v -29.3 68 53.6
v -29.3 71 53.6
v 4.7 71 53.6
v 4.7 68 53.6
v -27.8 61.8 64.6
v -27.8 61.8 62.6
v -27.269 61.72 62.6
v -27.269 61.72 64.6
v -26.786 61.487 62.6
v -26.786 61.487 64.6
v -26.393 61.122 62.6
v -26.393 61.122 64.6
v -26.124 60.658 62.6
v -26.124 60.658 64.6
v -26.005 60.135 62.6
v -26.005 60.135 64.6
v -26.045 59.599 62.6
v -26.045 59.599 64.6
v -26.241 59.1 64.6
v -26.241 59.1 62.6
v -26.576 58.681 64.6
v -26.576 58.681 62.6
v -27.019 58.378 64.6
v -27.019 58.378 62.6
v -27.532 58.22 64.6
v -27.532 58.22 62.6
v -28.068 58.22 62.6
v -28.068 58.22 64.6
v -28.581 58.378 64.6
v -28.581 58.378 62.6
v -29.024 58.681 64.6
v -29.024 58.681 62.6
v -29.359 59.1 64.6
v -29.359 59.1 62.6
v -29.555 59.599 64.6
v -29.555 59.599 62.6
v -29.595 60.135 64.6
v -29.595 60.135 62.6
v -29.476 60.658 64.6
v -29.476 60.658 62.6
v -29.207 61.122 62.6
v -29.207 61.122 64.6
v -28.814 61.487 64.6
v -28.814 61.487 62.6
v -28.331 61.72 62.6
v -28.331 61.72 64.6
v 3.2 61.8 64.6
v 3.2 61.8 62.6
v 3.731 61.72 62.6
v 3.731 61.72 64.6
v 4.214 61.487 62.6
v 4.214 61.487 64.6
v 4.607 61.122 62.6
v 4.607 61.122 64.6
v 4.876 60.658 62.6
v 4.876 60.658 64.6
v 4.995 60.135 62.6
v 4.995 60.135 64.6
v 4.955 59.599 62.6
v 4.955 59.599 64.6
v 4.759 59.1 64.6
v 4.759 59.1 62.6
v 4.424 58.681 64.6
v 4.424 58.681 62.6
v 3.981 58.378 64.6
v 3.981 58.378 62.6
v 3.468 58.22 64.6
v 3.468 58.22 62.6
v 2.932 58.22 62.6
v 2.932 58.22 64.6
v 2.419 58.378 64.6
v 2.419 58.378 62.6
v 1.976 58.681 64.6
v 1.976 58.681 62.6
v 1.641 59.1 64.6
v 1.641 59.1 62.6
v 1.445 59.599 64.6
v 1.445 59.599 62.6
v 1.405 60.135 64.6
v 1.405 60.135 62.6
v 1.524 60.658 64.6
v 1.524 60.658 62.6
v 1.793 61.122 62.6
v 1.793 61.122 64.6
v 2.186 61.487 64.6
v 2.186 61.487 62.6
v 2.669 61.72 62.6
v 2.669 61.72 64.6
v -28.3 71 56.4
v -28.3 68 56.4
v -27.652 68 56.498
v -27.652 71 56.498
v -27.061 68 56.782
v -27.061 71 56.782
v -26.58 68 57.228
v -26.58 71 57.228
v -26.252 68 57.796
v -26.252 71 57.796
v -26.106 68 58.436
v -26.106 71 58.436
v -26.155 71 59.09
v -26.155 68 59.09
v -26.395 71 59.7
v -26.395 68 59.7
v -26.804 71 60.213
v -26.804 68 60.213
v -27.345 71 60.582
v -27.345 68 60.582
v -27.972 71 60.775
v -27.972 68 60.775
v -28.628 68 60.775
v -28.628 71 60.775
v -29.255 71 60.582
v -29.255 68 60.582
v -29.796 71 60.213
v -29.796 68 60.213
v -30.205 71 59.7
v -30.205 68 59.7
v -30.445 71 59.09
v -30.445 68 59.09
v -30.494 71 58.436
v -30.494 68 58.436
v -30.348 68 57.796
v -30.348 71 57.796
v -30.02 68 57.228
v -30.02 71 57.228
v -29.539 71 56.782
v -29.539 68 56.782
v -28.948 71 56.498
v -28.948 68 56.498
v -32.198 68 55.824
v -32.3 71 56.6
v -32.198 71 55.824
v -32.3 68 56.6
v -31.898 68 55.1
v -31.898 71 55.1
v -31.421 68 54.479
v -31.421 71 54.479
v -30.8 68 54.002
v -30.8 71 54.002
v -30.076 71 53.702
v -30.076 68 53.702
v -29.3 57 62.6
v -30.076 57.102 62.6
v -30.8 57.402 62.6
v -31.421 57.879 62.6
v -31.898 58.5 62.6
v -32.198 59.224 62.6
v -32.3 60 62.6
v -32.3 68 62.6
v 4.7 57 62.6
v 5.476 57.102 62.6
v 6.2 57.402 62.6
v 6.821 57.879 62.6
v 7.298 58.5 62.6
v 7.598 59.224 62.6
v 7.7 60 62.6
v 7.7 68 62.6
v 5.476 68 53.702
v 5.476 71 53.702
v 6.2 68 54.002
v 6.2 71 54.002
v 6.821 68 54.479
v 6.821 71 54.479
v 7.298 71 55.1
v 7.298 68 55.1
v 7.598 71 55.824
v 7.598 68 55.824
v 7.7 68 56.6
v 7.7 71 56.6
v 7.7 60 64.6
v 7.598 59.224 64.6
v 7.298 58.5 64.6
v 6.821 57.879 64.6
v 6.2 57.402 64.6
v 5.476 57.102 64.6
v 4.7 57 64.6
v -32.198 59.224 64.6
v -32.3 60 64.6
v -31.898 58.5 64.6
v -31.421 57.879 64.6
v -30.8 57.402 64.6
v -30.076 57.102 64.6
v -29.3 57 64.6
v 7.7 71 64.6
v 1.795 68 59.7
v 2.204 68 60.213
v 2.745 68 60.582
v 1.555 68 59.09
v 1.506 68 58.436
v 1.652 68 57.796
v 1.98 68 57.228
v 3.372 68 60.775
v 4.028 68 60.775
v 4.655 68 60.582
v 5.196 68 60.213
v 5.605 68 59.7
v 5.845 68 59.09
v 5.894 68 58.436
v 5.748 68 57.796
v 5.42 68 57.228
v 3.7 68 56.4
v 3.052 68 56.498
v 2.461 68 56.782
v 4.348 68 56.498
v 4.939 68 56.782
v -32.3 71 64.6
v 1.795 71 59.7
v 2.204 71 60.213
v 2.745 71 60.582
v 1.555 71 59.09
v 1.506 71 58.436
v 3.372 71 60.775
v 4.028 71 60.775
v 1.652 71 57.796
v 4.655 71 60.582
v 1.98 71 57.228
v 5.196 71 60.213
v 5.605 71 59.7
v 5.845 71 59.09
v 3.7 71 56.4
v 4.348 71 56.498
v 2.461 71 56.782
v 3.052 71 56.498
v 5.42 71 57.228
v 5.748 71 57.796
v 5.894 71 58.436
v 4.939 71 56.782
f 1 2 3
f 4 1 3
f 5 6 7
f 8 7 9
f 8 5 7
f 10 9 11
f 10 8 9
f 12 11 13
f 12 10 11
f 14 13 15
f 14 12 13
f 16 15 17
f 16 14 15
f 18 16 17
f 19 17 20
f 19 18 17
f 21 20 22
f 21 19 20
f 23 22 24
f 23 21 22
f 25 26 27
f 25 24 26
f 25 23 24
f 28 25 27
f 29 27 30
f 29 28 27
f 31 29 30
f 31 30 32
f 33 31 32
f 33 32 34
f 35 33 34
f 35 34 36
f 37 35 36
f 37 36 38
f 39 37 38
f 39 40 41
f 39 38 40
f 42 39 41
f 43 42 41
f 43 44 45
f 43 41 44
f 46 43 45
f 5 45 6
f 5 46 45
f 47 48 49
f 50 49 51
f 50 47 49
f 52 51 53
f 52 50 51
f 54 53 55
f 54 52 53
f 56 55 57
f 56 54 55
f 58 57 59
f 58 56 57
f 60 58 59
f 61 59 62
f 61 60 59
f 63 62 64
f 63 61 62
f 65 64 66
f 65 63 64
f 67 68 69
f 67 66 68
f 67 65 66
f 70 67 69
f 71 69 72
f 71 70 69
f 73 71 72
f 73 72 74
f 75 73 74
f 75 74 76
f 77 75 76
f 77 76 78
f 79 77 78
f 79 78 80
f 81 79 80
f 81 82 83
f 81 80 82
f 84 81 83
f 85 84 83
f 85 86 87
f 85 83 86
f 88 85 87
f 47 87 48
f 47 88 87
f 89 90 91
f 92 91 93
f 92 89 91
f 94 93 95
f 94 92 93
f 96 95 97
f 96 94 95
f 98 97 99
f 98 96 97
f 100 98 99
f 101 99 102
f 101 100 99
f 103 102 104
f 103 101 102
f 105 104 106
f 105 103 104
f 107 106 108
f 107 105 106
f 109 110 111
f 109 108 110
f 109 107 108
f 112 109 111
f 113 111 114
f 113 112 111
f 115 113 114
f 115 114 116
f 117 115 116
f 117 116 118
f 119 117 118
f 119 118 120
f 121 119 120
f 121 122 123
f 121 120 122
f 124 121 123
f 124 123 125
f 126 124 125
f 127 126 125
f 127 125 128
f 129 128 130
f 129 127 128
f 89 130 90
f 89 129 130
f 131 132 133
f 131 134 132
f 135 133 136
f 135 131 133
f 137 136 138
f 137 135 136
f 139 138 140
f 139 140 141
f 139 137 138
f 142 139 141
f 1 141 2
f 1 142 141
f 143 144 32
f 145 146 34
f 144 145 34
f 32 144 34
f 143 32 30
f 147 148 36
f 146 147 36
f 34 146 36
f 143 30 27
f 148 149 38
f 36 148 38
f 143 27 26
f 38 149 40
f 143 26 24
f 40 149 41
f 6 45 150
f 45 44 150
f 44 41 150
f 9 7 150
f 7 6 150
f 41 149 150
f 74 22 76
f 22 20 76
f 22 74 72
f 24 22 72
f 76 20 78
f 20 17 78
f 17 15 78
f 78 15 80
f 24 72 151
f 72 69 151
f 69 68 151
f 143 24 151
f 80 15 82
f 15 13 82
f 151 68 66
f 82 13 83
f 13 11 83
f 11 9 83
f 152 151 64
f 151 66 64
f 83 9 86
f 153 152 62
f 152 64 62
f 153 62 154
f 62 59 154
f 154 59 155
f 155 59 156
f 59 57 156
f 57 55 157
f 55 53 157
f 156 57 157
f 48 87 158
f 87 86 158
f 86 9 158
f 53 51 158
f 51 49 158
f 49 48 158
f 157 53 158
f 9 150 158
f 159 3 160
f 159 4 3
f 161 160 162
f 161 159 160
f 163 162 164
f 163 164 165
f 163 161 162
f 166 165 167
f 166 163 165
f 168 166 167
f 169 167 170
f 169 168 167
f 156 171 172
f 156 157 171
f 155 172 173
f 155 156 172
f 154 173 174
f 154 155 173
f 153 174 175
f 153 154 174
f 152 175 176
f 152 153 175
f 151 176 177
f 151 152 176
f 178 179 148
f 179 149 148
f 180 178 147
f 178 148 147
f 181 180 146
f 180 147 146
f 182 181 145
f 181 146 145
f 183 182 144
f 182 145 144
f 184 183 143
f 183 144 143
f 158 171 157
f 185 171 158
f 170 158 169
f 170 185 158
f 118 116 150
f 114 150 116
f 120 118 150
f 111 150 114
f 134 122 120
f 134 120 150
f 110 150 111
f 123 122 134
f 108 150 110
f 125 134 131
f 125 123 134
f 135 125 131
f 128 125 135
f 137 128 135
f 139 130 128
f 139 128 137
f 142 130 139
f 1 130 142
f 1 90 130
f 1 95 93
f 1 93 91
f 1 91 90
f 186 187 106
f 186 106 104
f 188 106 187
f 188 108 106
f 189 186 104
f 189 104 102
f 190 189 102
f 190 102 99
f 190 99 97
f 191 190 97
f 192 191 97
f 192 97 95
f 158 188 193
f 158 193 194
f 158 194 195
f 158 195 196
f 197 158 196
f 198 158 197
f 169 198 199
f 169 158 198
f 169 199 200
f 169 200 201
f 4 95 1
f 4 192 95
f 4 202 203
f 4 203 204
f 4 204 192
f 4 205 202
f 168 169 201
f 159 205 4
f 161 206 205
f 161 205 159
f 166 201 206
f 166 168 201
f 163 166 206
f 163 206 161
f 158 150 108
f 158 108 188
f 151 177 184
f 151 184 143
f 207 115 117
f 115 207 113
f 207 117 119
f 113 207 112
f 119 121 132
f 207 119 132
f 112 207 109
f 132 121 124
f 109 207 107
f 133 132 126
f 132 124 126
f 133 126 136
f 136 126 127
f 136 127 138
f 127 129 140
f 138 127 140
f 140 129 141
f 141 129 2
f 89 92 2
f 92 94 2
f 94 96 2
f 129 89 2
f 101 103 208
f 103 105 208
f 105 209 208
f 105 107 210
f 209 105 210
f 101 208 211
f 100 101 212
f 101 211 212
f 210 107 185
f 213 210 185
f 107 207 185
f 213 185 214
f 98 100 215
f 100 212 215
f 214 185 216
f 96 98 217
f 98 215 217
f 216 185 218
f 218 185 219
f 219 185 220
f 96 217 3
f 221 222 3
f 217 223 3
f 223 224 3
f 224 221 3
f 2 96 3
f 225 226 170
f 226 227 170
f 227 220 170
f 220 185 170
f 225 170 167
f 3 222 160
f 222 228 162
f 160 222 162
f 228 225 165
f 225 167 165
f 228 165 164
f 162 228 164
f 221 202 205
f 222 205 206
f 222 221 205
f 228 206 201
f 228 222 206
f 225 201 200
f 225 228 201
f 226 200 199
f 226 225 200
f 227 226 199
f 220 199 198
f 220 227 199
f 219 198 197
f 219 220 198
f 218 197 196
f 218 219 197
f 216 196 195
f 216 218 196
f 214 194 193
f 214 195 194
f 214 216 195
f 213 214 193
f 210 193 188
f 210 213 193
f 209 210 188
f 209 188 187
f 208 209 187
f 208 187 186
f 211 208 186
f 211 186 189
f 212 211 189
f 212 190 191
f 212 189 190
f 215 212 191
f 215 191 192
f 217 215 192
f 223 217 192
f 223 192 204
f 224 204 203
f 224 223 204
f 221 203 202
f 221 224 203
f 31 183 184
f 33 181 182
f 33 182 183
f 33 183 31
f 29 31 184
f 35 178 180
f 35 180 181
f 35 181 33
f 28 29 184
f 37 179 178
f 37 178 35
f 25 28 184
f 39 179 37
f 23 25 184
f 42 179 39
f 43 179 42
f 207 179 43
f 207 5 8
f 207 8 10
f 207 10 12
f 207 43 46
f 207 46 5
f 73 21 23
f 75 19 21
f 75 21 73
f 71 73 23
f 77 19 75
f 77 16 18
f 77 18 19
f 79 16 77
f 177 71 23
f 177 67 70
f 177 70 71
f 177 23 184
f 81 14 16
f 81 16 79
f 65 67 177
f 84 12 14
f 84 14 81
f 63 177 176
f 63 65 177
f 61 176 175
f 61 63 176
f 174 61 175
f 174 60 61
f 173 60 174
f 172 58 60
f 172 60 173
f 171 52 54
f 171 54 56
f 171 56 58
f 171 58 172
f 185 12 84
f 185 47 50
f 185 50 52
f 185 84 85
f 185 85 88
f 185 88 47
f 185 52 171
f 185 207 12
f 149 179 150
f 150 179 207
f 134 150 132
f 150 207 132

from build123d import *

# Parameters (mm, degrees)
CYLINDER001_R            = 2.2
CYLINDER001_DEPTH        = 10
ARRAY005_Y_COUNT         = 2
ARRAY005_Y_PITCH         = 32
CYLINDER008_R            = 1.8
CYLINDER008_DEPTH        = 10
ARRAY004_Y_COUNT         = 2
ARRAY004_Y_PITCH         = 31
ARRAY004_PLACEMENT_ANGLE = 90
BOX007_W                 = 2
BOX007_H                 = 40
BOX007_DEPTH             = 11
FILLET004_R              = 3
BOX006_W                 = 11
BOX006_H                 = 40
BOX006_DEPTH             = 3
FILLET003_R              = 3
CUT005_PITCH_ANGLE       = 90
CUT005_PLACEMENT_ANGLE   = -90


with BuildPart() as pcb_hole_array:
    # Cylinder001 → Cylinder001 (new body)
    with BuildSketch(Plane.XY):
        Circle(CYLINDER001_R)
    extrude(amount=CYLINDER001_DEPTH)

    # Array005 Y: pcb hole array ×2


with BuildPart() as pcb_hole_array_1:
    add(pcb_hole_array.part)
    with Locations(*[(0, i * ARRAY005_Y_PITCH, 0) for i in range(1, ARRAY005_Y_COUNT)]):
        add(pcb_hole_array.part)


with BuildPart() as pcb_hole_array_2:
    # Array005 placement: moved
    add(pcb_hole_array_1.part.moved(Location((6, 4, -3))))


with BuildPart() as fusion010:
    # Cylinder008 → Cylinder008 (new body)
    with BuildSketch(Plane.XY):
        Circle(CYLINDER008_R)
    extrude(amount=CYLINDER008_DEPTH)

    # Array004 Y: Fusion010 ×2


with BuildPart() as fusion010_1:
    add(fusion010.part)
    with Locations(*[(0, i * ARRAY004_Y_PITCH, 0) for i in range(1, ARRAY004_Y_COUNT)]):
        add(fusion010.part)


with BuildPart() as fusion010_2:
    # Array004 placement: moved
    add(fusion010_1.part.moved(Location((0, 4.5, 8))).rotate(Axis((0, 4.5, 8), (0, 1, 0)), ARRAY004_PLACEMENT_ANGLE))

    # Fusion010: union pcb hole array
    add(pcb_hole_array_2.part)


with BuildPart() as fillet004:
    # Box007 → Box007 (new body)
    with BuildSketch(Plane.XY):
        with Locations((1, 20)):
            Rectangle(BOX007_W, BOX007_H)
    extrude(amount=BOX007_DEPTH)

    # Fillet004
    fillet004_edges = [fillet004.edges().sort_by_distance(p)[0] for p in [
        (1, 0, 11),
        (1, 40, 11),
    ]]
    fillet(fillet004_edges, radius=FILLET004_R)


with BuildPart() as pcb_holder_cut:
    # Box006 → Box006 (new body)
    with BuildSketch(Plane.XY.offset(-3)):
        with Locations((5.5, 20)):
            Rectangle(BOX006_W, BOX006_H)
    extrude(amount=BOX006_DEPTH)

    # Fillet003
    fillet003_edges = [pcb_holder_cut.edges().sort_by_distance(p)[0] for p in [
        (11, 0, -1.5),
        (11, 40, -1.5),
    ]]
    fillet(fillet003_edges, radius=FILLET003_R)

    # Fusion011: union Fillet004
    add(fillet004.part)

    # Cut005: cut Fusion010
    add(fusion010_2.part, mode=Mode.SUBTRACT)


with BuildPart() as pcb_holder_cut_1:
    # Cut005 pitch: moved
    add(pcb_holder_cut.part.rotate(Axis((0, 0, 0), (0, 1, 0)), CUT005_PITCH_ANGLE))


with BuildPart() as pcb_holder_cut_2:
    # Cut005 placement: moved
    add(pcb_holder_cut_1.part.moved(Location((-32.3, 68, 64.6))).rotate(Axis((-32.3, 68, 64.6), (0, 0, 1)), CUT005_PLACEMENT_ANGLE))


solid = pcb_holder_cut_2.part
